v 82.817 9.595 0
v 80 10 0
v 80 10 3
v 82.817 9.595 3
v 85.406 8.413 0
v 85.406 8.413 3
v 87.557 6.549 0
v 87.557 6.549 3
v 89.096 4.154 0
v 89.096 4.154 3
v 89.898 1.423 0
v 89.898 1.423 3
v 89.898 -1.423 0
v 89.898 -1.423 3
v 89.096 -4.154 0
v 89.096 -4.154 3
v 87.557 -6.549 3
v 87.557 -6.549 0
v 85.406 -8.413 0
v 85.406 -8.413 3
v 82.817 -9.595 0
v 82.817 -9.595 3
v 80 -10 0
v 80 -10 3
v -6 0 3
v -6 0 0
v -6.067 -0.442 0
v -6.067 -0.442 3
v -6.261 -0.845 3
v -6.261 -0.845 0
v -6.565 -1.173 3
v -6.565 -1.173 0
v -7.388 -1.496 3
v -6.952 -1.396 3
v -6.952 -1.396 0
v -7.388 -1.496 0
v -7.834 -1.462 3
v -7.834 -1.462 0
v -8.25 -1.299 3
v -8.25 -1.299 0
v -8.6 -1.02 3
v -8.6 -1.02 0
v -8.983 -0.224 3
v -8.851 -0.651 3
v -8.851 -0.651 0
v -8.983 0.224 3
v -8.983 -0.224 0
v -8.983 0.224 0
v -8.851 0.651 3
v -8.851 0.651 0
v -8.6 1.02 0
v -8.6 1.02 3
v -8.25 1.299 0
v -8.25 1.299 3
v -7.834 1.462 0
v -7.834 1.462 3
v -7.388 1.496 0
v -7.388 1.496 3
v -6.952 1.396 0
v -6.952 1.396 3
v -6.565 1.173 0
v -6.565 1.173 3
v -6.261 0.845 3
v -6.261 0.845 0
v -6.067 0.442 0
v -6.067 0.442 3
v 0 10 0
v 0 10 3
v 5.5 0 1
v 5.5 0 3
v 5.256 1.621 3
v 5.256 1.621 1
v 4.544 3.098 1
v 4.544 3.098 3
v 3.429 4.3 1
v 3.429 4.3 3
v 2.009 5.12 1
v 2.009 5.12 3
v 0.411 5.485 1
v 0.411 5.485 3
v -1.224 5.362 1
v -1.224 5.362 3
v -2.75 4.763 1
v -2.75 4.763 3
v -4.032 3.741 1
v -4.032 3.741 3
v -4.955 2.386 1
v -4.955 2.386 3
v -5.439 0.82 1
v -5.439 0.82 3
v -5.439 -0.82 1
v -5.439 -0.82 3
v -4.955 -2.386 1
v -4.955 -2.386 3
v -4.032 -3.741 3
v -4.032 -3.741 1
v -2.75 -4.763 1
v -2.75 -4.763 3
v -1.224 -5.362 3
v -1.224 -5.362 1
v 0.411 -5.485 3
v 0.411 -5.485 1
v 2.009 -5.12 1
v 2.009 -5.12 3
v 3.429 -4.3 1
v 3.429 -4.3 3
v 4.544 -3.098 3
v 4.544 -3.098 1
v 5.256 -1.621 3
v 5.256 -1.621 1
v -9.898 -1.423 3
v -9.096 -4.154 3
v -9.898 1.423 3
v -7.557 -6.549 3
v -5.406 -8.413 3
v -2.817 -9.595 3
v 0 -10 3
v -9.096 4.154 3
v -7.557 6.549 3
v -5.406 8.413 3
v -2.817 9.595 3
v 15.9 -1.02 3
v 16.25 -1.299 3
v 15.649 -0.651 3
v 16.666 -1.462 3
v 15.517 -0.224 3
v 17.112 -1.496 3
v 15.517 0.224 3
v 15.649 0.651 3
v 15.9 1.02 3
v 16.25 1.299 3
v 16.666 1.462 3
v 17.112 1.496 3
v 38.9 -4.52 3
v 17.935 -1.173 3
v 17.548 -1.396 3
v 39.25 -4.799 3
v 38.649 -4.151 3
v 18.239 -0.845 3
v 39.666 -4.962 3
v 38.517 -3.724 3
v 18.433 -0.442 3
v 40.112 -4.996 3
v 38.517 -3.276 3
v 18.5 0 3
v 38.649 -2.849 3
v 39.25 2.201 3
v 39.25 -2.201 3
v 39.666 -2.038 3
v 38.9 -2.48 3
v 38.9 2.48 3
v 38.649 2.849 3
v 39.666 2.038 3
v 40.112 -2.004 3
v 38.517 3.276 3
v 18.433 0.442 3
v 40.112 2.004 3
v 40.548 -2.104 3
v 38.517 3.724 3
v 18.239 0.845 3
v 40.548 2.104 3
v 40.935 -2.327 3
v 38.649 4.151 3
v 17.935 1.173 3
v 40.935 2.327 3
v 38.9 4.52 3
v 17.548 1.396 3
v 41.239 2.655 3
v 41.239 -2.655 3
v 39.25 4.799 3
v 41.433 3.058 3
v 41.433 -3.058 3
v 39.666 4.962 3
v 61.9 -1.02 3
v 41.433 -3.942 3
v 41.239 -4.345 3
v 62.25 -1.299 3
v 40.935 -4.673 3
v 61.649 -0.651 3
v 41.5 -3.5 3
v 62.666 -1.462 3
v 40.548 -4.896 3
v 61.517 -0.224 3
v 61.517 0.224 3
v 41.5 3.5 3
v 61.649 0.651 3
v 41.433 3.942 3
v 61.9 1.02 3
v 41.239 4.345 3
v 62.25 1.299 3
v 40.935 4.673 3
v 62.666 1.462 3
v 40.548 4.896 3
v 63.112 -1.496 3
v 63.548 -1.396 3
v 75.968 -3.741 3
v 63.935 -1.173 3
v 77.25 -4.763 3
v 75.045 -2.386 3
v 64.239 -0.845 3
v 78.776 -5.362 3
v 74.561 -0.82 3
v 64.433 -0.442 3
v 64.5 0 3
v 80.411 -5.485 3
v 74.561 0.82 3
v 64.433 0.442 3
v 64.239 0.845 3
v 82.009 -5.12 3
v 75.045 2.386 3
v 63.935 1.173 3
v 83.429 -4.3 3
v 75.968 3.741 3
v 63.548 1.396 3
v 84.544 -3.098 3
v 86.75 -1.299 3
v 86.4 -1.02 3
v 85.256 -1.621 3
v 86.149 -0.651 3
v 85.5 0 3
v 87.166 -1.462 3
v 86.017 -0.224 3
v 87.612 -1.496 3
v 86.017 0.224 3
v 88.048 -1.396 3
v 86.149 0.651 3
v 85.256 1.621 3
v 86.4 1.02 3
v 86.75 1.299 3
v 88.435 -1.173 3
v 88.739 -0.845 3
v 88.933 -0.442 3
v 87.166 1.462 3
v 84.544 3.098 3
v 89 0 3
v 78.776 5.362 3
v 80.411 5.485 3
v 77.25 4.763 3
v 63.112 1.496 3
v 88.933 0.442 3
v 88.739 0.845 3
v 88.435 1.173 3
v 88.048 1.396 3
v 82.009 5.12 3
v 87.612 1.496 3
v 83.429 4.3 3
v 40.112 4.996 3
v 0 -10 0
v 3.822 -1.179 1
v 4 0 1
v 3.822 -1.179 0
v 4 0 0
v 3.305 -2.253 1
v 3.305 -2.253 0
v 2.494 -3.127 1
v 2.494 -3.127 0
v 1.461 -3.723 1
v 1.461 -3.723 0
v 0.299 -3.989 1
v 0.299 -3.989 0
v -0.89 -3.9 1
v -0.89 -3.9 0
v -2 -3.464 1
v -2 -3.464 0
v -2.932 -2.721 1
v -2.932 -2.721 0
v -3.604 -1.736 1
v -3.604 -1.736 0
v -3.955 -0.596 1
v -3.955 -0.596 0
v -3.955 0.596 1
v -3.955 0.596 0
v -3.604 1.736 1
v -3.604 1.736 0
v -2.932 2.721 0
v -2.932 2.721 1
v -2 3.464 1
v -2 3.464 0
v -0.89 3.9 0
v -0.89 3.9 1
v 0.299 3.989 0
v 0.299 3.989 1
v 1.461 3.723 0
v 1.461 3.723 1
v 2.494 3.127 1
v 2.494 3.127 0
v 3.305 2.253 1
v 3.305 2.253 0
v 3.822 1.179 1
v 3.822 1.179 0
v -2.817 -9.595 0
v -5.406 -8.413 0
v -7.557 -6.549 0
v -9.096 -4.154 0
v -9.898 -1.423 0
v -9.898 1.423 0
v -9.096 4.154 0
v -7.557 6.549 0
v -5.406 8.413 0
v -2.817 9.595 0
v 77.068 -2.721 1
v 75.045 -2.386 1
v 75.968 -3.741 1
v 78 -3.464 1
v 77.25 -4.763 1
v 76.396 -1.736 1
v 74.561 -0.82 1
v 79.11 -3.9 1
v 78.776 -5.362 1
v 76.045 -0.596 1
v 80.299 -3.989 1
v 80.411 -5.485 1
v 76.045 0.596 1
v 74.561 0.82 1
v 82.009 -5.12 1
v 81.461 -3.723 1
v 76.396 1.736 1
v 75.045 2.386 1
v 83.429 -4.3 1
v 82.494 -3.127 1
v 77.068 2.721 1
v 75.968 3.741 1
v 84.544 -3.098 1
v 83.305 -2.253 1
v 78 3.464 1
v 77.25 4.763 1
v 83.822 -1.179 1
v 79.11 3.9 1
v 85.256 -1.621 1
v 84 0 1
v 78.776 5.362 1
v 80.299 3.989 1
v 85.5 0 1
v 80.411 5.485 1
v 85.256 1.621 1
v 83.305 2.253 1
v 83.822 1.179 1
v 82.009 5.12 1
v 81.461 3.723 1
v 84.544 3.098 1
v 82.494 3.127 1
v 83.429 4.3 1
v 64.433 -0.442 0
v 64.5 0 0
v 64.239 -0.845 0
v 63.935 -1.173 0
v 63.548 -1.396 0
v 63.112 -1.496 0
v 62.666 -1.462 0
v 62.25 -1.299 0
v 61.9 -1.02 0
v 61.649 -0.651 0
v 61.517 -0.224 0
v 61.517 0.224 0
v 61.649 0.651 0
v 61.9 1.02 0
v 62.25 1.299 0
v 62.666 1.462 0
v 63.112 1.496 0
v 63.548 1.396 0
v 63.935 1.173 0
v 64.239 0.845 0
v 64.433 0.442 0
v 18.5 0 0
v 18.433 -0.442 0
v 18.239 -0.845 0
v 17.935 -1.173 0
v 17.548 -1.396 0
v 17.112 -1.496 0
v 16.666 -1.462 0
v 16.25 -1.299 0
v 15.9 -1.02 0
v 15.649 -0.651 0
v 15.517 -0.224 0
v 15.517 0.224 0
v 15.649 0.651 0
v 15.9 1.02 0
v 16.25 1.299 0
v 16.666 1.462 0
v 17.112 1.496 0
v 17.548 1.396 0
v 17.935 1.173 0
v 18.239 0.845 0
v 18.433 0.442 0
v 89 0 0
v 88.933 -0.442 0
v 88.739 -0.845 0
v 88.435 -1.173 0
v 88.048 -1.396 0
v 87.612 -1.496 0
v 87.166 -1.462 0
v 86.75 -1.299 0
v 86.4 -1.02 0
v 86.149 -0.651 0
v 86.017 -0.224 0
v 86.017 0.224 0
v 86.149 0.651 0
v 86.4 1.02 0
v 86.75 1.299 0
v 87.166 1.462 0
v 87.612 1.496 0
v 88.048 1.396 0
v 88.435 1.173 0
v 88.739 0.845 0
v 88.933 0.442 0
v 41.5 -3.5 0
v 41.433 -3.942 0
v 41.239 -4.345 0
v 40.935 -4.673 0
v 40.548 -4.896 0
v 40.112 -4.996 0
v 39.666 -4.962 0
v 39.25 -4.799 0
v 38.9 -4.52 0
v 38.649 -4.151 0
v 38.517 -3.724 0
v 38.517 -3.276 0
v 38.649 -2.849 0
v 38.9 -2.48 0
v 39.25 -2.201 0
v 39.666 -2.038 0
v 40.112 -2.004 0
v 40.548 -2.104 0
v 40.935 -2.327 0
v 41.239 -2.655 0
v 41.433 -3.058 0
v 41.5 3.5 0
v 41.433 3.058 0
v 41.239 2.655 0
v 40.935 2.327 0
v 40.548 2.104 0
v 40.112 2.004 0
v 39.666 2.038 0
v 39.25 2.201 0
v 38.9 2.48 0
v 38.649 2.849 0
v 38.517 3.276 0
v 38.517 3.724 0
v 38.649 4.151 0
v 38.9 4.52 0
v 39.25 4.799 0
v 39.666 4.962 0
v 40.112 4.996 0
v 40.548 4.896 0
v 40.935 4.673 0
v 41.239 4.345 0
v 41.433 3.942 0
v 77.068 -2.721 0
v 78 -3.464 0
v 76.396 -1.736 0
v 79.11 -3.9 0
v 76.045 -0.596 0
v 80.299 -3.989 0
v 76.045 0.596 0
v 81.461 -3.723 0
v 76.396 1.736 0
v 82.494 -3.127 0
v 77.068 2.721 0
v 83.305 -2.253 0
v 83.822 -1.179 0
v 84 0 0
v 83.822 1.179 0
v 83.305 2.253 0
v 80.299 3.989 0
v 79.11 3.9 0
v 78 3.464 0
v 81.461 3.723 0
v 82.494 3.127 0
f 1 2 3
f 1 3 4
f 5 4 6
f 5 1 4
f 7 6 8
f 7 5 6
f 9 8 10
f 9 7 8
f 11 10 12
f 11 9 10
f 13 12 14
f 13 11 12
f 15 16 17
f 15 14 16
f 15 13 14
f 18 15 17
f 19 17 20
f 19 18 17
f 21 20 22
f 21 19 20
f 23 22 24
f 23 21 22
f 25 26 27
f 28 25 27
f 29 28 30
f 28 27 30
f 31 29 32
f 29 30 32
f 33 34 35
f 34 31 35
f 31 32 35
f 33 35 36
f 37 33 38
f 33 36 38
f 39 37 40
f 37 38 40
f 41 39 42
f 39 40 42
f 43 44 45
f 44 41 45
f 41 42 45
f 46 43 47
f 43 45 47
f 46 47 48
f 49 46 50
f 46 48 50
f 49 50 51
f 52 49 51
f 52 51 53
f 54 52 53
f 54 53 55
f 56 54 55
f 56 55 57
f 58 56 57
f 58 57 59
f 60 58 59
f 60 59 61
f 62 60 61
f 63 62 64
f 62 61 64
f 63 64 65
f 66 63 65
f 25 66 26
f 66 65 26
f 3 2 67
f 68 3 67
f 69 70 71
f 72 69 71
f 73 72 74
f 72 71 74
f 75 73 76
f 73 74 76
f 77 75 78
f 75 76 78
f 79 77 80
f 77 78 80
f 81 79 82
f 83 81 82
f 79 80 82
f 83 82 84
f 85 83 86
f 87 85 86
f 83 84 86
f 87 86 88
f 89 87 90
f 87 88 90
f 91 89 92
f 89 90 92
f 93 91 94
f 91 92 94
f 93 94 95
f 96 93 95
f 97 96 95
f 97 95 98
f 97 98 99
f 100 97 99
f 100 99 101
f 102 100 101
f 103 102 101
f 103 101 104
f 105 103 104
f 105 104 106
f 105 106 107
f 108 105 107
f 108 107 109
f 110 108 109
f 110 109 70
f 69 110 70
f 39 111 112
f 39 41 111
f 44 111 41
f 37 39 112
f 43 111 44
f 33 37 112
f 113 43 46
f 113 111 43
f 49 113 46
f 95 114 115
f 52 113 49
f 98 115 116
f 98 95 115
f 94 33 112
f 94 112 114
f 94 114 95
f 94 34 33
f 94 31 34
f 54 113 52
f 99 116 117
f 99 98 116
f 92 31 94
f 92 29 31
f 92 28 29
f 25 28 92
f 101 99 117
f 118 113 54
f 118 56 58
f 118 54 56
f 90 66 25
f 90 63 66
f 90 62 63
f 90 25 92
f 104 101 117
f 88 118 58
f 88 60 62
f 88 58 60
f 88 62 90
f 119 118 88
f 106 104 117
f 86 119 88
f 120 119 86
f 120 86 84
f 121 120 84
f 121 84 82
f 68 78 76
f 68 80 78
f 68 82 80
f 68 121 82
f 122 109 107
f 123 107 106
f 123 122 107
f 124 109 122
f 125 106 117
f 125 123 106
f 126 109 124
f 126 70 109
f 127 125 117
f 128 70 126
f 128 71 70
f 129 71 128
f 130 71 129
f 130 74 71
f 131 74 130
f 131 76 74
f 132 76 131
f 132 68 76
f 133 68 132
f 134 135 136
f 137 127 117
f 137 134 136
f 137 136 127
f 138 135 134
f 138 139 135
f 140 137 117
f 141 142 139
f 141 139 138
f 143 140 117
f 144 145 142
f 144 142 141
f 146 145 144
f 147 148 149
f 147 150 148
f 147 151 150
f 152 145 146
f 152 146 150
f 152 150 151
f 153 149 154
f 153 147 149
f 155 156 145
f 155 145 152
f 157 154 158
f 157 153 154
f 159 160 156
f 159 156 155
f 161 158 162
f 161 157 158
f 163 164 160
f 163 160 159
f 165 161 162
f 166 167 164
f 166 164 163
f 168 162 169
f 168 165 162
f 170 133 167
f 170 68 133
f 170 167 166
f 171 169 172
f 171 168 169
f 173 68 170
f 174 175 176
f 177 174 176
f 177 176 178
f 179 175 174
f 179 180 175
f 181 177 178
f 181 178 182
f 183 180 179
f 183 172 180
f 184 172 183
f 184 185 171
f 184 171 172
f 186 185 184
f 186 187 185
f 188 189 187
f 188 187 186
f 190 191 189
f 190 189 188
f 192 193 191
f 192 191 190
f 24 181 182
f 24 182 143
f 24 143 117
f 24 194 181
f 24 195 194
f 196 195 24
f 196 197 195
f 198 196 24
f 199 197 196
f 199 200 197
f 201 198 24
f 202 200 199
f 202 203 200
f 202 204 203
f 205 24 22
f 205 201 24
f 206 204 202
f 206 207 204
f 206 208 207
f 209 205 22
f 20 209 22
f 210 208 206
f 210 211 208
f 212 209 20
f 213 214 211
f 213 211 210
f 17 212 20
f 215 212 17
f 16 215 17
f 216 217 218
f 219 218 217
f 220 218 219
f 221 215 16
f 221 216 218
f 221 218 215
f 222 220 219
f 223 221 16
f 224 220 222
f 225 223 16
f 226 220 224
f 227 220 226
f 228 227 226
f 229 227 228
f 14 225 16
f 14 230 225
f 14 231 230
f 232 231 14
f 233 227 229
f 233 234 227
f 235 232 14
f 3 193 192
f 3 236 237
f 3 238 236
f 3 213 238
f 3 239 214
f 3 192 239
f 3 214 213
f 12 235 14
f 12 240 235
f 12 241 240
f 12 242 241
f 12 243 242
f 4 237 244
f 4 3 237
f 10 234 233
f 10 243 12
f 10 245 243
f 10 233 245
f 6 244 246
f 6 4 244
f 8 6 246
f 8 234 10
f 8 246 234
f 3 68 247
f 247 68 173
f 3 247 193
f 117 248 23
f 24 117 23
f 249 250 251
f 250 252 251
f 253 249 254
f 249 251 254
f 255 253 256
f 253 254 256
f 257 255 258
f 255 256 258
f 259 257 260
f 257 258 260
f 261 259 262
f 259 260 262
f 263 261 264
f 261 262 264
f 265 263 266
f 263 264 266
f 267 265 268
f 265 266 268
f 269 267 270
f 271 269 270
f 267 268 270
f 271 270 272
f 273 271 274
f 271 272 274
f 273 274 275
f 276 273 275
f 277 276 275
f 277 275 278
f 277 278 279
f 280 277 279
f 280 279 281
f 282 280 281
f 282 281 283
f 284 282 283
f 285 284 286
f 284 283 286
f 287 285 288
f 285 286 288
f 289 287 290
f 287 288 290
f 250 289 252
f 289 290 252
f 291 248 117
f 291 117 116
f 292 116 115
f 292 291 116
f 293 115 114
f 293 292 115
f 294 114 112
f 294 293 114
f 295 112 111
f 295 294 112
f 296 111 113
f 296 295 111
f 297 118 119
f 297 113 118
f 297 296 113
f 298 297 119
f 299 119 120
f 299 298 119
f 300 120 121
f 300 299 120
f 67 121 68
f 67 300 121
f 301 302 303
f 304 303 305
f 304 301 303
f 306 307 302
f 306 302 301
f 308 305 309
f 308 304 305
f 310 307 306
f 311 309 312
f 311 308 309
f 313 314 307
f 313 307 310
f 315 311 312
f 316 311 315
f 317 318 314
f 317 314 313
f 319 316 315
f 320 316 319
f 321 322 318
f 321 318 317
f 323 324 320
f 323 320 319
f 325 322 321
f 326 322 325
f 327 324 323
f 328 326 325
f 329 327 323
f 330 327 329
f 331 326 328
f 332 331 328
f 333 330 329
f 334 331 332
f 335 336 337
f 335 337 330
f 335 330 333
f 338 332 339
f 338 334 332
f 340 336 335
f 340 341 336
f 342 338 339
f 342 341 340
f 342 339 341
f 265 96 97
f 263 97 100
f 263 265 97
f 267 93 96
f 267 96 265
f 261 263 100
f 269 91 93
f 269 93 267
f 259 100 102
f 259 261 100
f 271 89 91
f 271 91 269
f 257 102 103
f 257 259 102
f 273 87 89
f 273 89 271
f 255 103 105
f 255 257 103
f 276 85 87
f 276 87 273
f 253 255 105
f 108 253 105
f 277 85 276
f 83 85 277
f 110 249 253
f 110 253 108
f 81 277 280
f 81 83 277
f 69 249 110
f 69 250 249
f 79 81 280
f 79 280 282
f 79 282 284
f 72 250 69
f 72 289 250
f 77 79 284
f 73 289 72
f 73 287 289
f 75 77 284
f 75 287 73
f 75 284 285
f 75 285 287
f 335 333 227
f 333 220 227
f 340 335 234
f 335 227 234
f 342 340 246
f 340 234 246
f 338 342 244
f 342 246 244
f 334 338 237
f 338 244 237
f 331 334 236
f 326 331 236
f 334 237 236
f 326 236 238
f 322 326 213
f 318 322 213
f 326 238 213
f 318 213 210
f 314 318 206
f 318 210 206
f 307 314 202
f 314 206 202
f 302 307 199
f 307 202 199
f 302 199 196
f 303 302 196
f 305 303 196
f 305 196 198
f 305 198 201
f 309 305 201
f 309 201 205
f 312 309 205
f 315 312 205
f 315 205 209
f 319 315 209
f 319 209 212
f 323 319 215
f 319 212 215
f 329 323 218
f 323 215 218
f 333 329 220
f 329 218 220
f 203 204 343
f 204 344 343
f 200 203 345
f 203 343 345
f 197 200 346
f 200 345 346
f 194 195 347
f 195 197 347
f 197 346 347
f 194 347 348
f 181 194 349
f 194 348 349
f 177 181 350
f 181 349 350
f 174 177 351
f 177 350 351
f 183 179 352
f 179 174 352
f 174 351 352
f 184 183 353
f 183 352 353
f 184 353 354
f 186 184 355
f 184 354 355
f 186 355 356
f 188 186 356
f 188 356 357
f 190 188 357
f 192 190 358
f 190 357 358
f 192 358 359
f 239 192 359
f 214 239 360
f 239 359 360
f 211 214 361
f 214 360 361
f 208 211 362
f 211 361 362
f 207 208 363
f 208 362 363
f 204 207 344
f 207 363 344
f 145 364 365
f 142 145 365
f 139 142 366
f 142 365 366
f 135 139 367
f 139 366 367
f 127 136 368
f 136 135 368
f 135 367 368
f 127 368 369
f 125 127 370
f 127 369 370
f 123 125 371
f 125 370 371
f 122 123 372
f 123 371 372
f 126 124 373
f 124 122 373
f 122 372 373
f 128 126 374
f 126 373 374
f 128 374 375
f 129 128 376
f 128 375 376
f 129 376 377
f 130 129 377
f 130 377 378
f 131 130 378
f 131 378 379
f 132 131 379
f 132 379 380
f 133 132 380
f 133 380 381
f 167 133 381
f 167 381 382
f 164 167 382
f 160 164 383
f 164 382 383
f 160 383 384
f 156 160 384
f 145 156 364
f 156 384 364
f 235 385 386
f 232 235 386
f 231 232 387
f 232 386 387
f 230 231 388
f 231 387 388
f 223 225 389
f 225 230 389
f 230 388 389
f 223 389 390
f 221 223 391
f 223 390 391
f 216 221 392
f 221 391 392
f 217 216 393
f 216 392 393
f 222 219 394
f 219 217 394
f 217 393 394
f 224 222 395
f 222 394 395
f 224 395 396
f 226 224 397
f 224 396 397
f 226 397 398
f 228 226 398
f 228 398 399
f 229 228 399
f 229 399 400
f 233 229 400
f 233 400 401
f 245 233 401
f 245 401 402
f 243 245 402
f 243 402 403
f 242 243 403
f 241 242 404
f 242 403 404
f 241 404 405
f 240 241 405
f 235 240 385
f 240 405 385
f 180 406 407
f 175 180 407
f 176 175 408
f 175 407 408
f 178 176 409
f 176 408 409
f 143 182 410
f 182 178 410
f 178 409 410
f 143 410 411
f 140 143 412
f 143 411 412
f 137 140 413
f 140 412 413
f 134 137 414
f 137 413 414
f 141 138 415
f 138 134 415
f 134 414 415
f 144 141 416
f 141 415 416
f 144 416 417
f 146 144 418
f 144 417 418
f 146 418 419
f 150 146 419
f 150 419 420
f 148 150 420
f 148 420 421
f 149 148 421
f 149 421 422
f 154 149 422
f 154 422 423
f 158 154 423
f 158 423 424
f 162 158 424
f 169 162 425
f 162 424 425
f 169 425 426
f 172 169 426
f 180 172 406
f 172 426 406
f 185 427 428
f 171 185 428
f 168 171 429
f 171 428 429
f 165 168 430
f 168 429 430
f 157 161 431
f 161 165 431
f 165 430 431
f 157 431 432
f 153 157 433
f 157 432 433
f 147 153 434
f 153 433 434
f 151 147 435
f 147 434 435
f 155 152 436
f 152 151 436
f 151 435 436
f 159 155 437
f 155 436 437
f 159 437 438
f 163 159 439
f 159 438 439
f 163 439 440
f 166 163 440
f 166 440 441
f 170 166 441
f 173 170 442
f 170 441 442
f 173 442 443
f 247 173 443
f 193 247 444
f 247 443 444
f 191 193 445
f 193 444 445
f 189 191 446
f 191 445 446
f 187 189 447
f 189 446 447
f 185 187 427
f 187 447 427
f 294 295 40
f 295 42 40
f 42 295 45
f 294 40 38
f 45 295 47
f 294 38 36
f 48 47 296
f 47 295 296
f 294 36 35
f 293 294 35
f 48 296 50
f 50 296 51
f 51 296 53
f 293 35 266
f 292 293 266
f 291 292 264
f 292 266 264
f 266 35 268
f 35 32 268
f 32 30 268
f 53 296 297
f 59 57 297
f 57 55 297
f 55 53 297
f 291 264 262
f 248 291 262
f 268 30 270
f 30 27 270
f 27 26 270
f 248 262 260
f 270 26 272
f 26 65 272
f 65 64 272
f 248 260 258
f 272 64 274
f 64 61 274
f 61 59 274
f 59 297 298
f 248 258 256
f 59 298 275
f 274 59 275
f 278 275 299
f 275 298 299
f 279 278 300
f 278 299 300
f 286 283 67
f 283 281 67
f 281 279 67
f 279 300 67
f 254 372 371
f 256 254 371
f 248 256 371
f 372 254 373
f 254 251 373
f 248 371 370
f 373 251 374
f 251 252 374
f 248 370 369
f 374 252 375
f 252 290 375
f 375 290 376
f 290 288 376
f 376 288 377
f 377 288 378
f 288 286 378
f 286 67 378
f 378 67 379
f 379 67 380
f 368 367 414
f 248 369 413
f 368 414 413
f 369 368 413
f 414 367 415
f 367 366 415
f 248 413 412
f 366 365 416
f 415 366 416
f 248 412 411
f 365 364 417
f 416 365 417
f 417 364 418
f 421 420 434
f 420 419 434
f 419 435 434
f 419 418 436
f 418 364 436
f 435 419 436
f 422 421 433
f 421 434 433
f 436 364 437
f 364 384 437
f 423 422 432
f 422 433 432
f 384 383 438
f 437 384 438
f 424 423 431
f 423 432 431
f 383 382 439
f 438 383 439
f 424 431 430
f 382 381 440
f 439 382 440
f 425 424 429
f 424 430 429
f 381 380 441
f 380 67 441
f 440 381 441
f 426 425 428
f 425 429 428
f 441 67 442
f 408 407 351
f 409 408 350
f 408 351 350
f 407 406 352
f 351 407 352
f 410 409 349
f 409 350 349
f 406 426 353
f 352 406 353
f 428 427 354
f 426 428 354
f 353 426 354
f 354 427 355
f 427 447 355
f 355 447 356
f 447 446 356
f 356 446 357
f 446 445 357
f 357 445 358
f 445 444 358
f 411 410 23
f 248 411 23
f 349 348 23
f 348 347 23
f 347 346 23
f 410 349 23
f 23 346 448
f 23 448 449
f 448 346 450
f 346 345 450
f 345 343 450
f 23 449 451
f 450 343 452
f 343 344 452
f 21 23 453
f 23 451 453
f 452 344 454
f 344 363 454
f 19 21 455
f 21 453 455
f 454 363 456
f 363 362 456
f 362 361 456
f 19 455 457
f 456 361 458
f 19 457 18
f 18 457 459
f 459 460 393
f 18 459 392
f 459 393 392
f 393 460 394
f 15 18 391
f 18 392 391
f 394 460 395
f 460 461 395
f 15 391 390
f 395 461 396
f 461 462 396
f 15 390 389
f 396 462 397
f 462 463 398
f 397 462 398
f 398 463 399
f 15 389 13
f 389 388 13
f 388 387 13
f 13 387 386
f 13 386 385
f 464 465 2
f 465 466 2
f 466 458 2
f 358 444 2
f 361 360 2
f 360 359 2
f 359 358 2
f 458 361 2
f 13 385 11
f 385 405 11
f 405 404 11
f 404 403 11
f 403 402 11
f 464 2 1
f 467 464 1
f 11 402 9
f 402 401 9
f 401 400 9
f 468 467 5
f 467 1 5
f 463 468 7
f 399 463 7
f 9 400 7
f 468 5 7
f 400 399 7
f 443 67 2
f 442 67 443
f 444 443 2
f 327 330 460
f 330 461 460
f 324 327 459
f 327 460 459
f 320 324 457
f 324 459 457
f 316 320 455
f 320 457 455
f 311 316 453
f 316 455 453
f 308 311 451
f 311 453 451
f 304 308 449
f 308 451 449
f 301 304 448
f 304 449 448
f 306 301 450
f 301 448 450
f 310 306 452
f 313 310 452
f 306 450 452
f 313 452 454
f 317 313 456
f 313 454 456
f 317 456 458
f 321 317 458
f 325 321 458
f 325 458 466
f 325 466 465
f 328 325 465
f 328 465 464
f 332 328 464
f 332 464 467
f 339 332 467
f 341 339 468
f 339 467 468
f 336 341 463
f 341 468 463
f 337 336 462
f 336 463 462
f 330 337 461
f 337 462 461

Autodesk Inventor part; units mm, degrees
ref_plane "YZ Plane" through (0, 0, 0) normal (1, 0, 0) x (0, 1, 0)
ref_plane "XZ Plane" through (0, 0, 0) normal (0, 1, 0) x (-1, 0, 0)
ref_plane "XY Plane" through (0, 0, 0) normal (0, 0, 1) x (1, 0, 0)
sketch "Sketch1" plane through (0, 0, 0) normal (0, 0, 1) x (1, 0, 0)
  line L0 (0, 0) -> (80, 0) construction
  line L1 (0, -10) -> (80, -10)
  line L2 (80, 10) -> (0, 10)
  arc A0 (0, 10) -> (0, -10) centre (0, 0) ccw
  arc A1 (80, -10) -> (80, 10) centre (80, 0) ccw
  line L3 (0, 0) -> (80, 0) construction
  circle A2 centre (0, 0) radius 4
  circle A3 centre (80, 0) radius 4
  circle A4 centre (40, 3.5) radius 1.5
  circle A5 centre (40, -3.5) radius 1.5
  circle A6 centre (87.5, 0) radius 1.5
  circle A7 centre (-7.5, 0) radius 1.5
  circle A8 centre (17, 0) radius 1.5
  circle A9 centre (63, 0) radius 1.5
  point P0 (40, 0)
  point P1 (40, 0)
  dimension "d0" = 80
  dimension "d1" = 0
  dimension "d2" = 20
  dimension "d3" = 8
  dimension "d4" = 8
  dimension "d5" = 3
  dimension "d6" = 3
  dimension "d7" = 3
  dimension "d8" = 3
  dimension "d9" = 0
  dimension "d10" = 7.5
  dimension "d11" = 0
  dimension "d12" = 7.5
  dimension "d13" = 3
  dimension "d14" = 3
  dimension "d15" = 3.5
  dimension "d16" = 3.5
  dimension "d17" = 17
  dimension "d18" = 17
  dimension "d19" = 0
  dimension "d20" = 0
extrude "Extrusion1" add sketch "Sketch1" along normal blind 3
sketch "Sketch2" plane through (0, 0, 3) normal (0, 0, 1) x (1, 0, 0)
  circle A0 centre (0, 0) radius 4 projected
  circle A1 centre (80, 0) radius 4 projected
  circle A2 centre (0, 0) radius 5.5
  circle A3 centre (80, 0) radius 5.5
  dimension "d23" = 11
  dimension "d24" = 11
extrude "Extrusion2" cut sketch "Sketch2" against normal blind 2 contours A0 | A1 | A2 | A3
properties part number "Arm4" material "Aluminum 6061, Welded"
